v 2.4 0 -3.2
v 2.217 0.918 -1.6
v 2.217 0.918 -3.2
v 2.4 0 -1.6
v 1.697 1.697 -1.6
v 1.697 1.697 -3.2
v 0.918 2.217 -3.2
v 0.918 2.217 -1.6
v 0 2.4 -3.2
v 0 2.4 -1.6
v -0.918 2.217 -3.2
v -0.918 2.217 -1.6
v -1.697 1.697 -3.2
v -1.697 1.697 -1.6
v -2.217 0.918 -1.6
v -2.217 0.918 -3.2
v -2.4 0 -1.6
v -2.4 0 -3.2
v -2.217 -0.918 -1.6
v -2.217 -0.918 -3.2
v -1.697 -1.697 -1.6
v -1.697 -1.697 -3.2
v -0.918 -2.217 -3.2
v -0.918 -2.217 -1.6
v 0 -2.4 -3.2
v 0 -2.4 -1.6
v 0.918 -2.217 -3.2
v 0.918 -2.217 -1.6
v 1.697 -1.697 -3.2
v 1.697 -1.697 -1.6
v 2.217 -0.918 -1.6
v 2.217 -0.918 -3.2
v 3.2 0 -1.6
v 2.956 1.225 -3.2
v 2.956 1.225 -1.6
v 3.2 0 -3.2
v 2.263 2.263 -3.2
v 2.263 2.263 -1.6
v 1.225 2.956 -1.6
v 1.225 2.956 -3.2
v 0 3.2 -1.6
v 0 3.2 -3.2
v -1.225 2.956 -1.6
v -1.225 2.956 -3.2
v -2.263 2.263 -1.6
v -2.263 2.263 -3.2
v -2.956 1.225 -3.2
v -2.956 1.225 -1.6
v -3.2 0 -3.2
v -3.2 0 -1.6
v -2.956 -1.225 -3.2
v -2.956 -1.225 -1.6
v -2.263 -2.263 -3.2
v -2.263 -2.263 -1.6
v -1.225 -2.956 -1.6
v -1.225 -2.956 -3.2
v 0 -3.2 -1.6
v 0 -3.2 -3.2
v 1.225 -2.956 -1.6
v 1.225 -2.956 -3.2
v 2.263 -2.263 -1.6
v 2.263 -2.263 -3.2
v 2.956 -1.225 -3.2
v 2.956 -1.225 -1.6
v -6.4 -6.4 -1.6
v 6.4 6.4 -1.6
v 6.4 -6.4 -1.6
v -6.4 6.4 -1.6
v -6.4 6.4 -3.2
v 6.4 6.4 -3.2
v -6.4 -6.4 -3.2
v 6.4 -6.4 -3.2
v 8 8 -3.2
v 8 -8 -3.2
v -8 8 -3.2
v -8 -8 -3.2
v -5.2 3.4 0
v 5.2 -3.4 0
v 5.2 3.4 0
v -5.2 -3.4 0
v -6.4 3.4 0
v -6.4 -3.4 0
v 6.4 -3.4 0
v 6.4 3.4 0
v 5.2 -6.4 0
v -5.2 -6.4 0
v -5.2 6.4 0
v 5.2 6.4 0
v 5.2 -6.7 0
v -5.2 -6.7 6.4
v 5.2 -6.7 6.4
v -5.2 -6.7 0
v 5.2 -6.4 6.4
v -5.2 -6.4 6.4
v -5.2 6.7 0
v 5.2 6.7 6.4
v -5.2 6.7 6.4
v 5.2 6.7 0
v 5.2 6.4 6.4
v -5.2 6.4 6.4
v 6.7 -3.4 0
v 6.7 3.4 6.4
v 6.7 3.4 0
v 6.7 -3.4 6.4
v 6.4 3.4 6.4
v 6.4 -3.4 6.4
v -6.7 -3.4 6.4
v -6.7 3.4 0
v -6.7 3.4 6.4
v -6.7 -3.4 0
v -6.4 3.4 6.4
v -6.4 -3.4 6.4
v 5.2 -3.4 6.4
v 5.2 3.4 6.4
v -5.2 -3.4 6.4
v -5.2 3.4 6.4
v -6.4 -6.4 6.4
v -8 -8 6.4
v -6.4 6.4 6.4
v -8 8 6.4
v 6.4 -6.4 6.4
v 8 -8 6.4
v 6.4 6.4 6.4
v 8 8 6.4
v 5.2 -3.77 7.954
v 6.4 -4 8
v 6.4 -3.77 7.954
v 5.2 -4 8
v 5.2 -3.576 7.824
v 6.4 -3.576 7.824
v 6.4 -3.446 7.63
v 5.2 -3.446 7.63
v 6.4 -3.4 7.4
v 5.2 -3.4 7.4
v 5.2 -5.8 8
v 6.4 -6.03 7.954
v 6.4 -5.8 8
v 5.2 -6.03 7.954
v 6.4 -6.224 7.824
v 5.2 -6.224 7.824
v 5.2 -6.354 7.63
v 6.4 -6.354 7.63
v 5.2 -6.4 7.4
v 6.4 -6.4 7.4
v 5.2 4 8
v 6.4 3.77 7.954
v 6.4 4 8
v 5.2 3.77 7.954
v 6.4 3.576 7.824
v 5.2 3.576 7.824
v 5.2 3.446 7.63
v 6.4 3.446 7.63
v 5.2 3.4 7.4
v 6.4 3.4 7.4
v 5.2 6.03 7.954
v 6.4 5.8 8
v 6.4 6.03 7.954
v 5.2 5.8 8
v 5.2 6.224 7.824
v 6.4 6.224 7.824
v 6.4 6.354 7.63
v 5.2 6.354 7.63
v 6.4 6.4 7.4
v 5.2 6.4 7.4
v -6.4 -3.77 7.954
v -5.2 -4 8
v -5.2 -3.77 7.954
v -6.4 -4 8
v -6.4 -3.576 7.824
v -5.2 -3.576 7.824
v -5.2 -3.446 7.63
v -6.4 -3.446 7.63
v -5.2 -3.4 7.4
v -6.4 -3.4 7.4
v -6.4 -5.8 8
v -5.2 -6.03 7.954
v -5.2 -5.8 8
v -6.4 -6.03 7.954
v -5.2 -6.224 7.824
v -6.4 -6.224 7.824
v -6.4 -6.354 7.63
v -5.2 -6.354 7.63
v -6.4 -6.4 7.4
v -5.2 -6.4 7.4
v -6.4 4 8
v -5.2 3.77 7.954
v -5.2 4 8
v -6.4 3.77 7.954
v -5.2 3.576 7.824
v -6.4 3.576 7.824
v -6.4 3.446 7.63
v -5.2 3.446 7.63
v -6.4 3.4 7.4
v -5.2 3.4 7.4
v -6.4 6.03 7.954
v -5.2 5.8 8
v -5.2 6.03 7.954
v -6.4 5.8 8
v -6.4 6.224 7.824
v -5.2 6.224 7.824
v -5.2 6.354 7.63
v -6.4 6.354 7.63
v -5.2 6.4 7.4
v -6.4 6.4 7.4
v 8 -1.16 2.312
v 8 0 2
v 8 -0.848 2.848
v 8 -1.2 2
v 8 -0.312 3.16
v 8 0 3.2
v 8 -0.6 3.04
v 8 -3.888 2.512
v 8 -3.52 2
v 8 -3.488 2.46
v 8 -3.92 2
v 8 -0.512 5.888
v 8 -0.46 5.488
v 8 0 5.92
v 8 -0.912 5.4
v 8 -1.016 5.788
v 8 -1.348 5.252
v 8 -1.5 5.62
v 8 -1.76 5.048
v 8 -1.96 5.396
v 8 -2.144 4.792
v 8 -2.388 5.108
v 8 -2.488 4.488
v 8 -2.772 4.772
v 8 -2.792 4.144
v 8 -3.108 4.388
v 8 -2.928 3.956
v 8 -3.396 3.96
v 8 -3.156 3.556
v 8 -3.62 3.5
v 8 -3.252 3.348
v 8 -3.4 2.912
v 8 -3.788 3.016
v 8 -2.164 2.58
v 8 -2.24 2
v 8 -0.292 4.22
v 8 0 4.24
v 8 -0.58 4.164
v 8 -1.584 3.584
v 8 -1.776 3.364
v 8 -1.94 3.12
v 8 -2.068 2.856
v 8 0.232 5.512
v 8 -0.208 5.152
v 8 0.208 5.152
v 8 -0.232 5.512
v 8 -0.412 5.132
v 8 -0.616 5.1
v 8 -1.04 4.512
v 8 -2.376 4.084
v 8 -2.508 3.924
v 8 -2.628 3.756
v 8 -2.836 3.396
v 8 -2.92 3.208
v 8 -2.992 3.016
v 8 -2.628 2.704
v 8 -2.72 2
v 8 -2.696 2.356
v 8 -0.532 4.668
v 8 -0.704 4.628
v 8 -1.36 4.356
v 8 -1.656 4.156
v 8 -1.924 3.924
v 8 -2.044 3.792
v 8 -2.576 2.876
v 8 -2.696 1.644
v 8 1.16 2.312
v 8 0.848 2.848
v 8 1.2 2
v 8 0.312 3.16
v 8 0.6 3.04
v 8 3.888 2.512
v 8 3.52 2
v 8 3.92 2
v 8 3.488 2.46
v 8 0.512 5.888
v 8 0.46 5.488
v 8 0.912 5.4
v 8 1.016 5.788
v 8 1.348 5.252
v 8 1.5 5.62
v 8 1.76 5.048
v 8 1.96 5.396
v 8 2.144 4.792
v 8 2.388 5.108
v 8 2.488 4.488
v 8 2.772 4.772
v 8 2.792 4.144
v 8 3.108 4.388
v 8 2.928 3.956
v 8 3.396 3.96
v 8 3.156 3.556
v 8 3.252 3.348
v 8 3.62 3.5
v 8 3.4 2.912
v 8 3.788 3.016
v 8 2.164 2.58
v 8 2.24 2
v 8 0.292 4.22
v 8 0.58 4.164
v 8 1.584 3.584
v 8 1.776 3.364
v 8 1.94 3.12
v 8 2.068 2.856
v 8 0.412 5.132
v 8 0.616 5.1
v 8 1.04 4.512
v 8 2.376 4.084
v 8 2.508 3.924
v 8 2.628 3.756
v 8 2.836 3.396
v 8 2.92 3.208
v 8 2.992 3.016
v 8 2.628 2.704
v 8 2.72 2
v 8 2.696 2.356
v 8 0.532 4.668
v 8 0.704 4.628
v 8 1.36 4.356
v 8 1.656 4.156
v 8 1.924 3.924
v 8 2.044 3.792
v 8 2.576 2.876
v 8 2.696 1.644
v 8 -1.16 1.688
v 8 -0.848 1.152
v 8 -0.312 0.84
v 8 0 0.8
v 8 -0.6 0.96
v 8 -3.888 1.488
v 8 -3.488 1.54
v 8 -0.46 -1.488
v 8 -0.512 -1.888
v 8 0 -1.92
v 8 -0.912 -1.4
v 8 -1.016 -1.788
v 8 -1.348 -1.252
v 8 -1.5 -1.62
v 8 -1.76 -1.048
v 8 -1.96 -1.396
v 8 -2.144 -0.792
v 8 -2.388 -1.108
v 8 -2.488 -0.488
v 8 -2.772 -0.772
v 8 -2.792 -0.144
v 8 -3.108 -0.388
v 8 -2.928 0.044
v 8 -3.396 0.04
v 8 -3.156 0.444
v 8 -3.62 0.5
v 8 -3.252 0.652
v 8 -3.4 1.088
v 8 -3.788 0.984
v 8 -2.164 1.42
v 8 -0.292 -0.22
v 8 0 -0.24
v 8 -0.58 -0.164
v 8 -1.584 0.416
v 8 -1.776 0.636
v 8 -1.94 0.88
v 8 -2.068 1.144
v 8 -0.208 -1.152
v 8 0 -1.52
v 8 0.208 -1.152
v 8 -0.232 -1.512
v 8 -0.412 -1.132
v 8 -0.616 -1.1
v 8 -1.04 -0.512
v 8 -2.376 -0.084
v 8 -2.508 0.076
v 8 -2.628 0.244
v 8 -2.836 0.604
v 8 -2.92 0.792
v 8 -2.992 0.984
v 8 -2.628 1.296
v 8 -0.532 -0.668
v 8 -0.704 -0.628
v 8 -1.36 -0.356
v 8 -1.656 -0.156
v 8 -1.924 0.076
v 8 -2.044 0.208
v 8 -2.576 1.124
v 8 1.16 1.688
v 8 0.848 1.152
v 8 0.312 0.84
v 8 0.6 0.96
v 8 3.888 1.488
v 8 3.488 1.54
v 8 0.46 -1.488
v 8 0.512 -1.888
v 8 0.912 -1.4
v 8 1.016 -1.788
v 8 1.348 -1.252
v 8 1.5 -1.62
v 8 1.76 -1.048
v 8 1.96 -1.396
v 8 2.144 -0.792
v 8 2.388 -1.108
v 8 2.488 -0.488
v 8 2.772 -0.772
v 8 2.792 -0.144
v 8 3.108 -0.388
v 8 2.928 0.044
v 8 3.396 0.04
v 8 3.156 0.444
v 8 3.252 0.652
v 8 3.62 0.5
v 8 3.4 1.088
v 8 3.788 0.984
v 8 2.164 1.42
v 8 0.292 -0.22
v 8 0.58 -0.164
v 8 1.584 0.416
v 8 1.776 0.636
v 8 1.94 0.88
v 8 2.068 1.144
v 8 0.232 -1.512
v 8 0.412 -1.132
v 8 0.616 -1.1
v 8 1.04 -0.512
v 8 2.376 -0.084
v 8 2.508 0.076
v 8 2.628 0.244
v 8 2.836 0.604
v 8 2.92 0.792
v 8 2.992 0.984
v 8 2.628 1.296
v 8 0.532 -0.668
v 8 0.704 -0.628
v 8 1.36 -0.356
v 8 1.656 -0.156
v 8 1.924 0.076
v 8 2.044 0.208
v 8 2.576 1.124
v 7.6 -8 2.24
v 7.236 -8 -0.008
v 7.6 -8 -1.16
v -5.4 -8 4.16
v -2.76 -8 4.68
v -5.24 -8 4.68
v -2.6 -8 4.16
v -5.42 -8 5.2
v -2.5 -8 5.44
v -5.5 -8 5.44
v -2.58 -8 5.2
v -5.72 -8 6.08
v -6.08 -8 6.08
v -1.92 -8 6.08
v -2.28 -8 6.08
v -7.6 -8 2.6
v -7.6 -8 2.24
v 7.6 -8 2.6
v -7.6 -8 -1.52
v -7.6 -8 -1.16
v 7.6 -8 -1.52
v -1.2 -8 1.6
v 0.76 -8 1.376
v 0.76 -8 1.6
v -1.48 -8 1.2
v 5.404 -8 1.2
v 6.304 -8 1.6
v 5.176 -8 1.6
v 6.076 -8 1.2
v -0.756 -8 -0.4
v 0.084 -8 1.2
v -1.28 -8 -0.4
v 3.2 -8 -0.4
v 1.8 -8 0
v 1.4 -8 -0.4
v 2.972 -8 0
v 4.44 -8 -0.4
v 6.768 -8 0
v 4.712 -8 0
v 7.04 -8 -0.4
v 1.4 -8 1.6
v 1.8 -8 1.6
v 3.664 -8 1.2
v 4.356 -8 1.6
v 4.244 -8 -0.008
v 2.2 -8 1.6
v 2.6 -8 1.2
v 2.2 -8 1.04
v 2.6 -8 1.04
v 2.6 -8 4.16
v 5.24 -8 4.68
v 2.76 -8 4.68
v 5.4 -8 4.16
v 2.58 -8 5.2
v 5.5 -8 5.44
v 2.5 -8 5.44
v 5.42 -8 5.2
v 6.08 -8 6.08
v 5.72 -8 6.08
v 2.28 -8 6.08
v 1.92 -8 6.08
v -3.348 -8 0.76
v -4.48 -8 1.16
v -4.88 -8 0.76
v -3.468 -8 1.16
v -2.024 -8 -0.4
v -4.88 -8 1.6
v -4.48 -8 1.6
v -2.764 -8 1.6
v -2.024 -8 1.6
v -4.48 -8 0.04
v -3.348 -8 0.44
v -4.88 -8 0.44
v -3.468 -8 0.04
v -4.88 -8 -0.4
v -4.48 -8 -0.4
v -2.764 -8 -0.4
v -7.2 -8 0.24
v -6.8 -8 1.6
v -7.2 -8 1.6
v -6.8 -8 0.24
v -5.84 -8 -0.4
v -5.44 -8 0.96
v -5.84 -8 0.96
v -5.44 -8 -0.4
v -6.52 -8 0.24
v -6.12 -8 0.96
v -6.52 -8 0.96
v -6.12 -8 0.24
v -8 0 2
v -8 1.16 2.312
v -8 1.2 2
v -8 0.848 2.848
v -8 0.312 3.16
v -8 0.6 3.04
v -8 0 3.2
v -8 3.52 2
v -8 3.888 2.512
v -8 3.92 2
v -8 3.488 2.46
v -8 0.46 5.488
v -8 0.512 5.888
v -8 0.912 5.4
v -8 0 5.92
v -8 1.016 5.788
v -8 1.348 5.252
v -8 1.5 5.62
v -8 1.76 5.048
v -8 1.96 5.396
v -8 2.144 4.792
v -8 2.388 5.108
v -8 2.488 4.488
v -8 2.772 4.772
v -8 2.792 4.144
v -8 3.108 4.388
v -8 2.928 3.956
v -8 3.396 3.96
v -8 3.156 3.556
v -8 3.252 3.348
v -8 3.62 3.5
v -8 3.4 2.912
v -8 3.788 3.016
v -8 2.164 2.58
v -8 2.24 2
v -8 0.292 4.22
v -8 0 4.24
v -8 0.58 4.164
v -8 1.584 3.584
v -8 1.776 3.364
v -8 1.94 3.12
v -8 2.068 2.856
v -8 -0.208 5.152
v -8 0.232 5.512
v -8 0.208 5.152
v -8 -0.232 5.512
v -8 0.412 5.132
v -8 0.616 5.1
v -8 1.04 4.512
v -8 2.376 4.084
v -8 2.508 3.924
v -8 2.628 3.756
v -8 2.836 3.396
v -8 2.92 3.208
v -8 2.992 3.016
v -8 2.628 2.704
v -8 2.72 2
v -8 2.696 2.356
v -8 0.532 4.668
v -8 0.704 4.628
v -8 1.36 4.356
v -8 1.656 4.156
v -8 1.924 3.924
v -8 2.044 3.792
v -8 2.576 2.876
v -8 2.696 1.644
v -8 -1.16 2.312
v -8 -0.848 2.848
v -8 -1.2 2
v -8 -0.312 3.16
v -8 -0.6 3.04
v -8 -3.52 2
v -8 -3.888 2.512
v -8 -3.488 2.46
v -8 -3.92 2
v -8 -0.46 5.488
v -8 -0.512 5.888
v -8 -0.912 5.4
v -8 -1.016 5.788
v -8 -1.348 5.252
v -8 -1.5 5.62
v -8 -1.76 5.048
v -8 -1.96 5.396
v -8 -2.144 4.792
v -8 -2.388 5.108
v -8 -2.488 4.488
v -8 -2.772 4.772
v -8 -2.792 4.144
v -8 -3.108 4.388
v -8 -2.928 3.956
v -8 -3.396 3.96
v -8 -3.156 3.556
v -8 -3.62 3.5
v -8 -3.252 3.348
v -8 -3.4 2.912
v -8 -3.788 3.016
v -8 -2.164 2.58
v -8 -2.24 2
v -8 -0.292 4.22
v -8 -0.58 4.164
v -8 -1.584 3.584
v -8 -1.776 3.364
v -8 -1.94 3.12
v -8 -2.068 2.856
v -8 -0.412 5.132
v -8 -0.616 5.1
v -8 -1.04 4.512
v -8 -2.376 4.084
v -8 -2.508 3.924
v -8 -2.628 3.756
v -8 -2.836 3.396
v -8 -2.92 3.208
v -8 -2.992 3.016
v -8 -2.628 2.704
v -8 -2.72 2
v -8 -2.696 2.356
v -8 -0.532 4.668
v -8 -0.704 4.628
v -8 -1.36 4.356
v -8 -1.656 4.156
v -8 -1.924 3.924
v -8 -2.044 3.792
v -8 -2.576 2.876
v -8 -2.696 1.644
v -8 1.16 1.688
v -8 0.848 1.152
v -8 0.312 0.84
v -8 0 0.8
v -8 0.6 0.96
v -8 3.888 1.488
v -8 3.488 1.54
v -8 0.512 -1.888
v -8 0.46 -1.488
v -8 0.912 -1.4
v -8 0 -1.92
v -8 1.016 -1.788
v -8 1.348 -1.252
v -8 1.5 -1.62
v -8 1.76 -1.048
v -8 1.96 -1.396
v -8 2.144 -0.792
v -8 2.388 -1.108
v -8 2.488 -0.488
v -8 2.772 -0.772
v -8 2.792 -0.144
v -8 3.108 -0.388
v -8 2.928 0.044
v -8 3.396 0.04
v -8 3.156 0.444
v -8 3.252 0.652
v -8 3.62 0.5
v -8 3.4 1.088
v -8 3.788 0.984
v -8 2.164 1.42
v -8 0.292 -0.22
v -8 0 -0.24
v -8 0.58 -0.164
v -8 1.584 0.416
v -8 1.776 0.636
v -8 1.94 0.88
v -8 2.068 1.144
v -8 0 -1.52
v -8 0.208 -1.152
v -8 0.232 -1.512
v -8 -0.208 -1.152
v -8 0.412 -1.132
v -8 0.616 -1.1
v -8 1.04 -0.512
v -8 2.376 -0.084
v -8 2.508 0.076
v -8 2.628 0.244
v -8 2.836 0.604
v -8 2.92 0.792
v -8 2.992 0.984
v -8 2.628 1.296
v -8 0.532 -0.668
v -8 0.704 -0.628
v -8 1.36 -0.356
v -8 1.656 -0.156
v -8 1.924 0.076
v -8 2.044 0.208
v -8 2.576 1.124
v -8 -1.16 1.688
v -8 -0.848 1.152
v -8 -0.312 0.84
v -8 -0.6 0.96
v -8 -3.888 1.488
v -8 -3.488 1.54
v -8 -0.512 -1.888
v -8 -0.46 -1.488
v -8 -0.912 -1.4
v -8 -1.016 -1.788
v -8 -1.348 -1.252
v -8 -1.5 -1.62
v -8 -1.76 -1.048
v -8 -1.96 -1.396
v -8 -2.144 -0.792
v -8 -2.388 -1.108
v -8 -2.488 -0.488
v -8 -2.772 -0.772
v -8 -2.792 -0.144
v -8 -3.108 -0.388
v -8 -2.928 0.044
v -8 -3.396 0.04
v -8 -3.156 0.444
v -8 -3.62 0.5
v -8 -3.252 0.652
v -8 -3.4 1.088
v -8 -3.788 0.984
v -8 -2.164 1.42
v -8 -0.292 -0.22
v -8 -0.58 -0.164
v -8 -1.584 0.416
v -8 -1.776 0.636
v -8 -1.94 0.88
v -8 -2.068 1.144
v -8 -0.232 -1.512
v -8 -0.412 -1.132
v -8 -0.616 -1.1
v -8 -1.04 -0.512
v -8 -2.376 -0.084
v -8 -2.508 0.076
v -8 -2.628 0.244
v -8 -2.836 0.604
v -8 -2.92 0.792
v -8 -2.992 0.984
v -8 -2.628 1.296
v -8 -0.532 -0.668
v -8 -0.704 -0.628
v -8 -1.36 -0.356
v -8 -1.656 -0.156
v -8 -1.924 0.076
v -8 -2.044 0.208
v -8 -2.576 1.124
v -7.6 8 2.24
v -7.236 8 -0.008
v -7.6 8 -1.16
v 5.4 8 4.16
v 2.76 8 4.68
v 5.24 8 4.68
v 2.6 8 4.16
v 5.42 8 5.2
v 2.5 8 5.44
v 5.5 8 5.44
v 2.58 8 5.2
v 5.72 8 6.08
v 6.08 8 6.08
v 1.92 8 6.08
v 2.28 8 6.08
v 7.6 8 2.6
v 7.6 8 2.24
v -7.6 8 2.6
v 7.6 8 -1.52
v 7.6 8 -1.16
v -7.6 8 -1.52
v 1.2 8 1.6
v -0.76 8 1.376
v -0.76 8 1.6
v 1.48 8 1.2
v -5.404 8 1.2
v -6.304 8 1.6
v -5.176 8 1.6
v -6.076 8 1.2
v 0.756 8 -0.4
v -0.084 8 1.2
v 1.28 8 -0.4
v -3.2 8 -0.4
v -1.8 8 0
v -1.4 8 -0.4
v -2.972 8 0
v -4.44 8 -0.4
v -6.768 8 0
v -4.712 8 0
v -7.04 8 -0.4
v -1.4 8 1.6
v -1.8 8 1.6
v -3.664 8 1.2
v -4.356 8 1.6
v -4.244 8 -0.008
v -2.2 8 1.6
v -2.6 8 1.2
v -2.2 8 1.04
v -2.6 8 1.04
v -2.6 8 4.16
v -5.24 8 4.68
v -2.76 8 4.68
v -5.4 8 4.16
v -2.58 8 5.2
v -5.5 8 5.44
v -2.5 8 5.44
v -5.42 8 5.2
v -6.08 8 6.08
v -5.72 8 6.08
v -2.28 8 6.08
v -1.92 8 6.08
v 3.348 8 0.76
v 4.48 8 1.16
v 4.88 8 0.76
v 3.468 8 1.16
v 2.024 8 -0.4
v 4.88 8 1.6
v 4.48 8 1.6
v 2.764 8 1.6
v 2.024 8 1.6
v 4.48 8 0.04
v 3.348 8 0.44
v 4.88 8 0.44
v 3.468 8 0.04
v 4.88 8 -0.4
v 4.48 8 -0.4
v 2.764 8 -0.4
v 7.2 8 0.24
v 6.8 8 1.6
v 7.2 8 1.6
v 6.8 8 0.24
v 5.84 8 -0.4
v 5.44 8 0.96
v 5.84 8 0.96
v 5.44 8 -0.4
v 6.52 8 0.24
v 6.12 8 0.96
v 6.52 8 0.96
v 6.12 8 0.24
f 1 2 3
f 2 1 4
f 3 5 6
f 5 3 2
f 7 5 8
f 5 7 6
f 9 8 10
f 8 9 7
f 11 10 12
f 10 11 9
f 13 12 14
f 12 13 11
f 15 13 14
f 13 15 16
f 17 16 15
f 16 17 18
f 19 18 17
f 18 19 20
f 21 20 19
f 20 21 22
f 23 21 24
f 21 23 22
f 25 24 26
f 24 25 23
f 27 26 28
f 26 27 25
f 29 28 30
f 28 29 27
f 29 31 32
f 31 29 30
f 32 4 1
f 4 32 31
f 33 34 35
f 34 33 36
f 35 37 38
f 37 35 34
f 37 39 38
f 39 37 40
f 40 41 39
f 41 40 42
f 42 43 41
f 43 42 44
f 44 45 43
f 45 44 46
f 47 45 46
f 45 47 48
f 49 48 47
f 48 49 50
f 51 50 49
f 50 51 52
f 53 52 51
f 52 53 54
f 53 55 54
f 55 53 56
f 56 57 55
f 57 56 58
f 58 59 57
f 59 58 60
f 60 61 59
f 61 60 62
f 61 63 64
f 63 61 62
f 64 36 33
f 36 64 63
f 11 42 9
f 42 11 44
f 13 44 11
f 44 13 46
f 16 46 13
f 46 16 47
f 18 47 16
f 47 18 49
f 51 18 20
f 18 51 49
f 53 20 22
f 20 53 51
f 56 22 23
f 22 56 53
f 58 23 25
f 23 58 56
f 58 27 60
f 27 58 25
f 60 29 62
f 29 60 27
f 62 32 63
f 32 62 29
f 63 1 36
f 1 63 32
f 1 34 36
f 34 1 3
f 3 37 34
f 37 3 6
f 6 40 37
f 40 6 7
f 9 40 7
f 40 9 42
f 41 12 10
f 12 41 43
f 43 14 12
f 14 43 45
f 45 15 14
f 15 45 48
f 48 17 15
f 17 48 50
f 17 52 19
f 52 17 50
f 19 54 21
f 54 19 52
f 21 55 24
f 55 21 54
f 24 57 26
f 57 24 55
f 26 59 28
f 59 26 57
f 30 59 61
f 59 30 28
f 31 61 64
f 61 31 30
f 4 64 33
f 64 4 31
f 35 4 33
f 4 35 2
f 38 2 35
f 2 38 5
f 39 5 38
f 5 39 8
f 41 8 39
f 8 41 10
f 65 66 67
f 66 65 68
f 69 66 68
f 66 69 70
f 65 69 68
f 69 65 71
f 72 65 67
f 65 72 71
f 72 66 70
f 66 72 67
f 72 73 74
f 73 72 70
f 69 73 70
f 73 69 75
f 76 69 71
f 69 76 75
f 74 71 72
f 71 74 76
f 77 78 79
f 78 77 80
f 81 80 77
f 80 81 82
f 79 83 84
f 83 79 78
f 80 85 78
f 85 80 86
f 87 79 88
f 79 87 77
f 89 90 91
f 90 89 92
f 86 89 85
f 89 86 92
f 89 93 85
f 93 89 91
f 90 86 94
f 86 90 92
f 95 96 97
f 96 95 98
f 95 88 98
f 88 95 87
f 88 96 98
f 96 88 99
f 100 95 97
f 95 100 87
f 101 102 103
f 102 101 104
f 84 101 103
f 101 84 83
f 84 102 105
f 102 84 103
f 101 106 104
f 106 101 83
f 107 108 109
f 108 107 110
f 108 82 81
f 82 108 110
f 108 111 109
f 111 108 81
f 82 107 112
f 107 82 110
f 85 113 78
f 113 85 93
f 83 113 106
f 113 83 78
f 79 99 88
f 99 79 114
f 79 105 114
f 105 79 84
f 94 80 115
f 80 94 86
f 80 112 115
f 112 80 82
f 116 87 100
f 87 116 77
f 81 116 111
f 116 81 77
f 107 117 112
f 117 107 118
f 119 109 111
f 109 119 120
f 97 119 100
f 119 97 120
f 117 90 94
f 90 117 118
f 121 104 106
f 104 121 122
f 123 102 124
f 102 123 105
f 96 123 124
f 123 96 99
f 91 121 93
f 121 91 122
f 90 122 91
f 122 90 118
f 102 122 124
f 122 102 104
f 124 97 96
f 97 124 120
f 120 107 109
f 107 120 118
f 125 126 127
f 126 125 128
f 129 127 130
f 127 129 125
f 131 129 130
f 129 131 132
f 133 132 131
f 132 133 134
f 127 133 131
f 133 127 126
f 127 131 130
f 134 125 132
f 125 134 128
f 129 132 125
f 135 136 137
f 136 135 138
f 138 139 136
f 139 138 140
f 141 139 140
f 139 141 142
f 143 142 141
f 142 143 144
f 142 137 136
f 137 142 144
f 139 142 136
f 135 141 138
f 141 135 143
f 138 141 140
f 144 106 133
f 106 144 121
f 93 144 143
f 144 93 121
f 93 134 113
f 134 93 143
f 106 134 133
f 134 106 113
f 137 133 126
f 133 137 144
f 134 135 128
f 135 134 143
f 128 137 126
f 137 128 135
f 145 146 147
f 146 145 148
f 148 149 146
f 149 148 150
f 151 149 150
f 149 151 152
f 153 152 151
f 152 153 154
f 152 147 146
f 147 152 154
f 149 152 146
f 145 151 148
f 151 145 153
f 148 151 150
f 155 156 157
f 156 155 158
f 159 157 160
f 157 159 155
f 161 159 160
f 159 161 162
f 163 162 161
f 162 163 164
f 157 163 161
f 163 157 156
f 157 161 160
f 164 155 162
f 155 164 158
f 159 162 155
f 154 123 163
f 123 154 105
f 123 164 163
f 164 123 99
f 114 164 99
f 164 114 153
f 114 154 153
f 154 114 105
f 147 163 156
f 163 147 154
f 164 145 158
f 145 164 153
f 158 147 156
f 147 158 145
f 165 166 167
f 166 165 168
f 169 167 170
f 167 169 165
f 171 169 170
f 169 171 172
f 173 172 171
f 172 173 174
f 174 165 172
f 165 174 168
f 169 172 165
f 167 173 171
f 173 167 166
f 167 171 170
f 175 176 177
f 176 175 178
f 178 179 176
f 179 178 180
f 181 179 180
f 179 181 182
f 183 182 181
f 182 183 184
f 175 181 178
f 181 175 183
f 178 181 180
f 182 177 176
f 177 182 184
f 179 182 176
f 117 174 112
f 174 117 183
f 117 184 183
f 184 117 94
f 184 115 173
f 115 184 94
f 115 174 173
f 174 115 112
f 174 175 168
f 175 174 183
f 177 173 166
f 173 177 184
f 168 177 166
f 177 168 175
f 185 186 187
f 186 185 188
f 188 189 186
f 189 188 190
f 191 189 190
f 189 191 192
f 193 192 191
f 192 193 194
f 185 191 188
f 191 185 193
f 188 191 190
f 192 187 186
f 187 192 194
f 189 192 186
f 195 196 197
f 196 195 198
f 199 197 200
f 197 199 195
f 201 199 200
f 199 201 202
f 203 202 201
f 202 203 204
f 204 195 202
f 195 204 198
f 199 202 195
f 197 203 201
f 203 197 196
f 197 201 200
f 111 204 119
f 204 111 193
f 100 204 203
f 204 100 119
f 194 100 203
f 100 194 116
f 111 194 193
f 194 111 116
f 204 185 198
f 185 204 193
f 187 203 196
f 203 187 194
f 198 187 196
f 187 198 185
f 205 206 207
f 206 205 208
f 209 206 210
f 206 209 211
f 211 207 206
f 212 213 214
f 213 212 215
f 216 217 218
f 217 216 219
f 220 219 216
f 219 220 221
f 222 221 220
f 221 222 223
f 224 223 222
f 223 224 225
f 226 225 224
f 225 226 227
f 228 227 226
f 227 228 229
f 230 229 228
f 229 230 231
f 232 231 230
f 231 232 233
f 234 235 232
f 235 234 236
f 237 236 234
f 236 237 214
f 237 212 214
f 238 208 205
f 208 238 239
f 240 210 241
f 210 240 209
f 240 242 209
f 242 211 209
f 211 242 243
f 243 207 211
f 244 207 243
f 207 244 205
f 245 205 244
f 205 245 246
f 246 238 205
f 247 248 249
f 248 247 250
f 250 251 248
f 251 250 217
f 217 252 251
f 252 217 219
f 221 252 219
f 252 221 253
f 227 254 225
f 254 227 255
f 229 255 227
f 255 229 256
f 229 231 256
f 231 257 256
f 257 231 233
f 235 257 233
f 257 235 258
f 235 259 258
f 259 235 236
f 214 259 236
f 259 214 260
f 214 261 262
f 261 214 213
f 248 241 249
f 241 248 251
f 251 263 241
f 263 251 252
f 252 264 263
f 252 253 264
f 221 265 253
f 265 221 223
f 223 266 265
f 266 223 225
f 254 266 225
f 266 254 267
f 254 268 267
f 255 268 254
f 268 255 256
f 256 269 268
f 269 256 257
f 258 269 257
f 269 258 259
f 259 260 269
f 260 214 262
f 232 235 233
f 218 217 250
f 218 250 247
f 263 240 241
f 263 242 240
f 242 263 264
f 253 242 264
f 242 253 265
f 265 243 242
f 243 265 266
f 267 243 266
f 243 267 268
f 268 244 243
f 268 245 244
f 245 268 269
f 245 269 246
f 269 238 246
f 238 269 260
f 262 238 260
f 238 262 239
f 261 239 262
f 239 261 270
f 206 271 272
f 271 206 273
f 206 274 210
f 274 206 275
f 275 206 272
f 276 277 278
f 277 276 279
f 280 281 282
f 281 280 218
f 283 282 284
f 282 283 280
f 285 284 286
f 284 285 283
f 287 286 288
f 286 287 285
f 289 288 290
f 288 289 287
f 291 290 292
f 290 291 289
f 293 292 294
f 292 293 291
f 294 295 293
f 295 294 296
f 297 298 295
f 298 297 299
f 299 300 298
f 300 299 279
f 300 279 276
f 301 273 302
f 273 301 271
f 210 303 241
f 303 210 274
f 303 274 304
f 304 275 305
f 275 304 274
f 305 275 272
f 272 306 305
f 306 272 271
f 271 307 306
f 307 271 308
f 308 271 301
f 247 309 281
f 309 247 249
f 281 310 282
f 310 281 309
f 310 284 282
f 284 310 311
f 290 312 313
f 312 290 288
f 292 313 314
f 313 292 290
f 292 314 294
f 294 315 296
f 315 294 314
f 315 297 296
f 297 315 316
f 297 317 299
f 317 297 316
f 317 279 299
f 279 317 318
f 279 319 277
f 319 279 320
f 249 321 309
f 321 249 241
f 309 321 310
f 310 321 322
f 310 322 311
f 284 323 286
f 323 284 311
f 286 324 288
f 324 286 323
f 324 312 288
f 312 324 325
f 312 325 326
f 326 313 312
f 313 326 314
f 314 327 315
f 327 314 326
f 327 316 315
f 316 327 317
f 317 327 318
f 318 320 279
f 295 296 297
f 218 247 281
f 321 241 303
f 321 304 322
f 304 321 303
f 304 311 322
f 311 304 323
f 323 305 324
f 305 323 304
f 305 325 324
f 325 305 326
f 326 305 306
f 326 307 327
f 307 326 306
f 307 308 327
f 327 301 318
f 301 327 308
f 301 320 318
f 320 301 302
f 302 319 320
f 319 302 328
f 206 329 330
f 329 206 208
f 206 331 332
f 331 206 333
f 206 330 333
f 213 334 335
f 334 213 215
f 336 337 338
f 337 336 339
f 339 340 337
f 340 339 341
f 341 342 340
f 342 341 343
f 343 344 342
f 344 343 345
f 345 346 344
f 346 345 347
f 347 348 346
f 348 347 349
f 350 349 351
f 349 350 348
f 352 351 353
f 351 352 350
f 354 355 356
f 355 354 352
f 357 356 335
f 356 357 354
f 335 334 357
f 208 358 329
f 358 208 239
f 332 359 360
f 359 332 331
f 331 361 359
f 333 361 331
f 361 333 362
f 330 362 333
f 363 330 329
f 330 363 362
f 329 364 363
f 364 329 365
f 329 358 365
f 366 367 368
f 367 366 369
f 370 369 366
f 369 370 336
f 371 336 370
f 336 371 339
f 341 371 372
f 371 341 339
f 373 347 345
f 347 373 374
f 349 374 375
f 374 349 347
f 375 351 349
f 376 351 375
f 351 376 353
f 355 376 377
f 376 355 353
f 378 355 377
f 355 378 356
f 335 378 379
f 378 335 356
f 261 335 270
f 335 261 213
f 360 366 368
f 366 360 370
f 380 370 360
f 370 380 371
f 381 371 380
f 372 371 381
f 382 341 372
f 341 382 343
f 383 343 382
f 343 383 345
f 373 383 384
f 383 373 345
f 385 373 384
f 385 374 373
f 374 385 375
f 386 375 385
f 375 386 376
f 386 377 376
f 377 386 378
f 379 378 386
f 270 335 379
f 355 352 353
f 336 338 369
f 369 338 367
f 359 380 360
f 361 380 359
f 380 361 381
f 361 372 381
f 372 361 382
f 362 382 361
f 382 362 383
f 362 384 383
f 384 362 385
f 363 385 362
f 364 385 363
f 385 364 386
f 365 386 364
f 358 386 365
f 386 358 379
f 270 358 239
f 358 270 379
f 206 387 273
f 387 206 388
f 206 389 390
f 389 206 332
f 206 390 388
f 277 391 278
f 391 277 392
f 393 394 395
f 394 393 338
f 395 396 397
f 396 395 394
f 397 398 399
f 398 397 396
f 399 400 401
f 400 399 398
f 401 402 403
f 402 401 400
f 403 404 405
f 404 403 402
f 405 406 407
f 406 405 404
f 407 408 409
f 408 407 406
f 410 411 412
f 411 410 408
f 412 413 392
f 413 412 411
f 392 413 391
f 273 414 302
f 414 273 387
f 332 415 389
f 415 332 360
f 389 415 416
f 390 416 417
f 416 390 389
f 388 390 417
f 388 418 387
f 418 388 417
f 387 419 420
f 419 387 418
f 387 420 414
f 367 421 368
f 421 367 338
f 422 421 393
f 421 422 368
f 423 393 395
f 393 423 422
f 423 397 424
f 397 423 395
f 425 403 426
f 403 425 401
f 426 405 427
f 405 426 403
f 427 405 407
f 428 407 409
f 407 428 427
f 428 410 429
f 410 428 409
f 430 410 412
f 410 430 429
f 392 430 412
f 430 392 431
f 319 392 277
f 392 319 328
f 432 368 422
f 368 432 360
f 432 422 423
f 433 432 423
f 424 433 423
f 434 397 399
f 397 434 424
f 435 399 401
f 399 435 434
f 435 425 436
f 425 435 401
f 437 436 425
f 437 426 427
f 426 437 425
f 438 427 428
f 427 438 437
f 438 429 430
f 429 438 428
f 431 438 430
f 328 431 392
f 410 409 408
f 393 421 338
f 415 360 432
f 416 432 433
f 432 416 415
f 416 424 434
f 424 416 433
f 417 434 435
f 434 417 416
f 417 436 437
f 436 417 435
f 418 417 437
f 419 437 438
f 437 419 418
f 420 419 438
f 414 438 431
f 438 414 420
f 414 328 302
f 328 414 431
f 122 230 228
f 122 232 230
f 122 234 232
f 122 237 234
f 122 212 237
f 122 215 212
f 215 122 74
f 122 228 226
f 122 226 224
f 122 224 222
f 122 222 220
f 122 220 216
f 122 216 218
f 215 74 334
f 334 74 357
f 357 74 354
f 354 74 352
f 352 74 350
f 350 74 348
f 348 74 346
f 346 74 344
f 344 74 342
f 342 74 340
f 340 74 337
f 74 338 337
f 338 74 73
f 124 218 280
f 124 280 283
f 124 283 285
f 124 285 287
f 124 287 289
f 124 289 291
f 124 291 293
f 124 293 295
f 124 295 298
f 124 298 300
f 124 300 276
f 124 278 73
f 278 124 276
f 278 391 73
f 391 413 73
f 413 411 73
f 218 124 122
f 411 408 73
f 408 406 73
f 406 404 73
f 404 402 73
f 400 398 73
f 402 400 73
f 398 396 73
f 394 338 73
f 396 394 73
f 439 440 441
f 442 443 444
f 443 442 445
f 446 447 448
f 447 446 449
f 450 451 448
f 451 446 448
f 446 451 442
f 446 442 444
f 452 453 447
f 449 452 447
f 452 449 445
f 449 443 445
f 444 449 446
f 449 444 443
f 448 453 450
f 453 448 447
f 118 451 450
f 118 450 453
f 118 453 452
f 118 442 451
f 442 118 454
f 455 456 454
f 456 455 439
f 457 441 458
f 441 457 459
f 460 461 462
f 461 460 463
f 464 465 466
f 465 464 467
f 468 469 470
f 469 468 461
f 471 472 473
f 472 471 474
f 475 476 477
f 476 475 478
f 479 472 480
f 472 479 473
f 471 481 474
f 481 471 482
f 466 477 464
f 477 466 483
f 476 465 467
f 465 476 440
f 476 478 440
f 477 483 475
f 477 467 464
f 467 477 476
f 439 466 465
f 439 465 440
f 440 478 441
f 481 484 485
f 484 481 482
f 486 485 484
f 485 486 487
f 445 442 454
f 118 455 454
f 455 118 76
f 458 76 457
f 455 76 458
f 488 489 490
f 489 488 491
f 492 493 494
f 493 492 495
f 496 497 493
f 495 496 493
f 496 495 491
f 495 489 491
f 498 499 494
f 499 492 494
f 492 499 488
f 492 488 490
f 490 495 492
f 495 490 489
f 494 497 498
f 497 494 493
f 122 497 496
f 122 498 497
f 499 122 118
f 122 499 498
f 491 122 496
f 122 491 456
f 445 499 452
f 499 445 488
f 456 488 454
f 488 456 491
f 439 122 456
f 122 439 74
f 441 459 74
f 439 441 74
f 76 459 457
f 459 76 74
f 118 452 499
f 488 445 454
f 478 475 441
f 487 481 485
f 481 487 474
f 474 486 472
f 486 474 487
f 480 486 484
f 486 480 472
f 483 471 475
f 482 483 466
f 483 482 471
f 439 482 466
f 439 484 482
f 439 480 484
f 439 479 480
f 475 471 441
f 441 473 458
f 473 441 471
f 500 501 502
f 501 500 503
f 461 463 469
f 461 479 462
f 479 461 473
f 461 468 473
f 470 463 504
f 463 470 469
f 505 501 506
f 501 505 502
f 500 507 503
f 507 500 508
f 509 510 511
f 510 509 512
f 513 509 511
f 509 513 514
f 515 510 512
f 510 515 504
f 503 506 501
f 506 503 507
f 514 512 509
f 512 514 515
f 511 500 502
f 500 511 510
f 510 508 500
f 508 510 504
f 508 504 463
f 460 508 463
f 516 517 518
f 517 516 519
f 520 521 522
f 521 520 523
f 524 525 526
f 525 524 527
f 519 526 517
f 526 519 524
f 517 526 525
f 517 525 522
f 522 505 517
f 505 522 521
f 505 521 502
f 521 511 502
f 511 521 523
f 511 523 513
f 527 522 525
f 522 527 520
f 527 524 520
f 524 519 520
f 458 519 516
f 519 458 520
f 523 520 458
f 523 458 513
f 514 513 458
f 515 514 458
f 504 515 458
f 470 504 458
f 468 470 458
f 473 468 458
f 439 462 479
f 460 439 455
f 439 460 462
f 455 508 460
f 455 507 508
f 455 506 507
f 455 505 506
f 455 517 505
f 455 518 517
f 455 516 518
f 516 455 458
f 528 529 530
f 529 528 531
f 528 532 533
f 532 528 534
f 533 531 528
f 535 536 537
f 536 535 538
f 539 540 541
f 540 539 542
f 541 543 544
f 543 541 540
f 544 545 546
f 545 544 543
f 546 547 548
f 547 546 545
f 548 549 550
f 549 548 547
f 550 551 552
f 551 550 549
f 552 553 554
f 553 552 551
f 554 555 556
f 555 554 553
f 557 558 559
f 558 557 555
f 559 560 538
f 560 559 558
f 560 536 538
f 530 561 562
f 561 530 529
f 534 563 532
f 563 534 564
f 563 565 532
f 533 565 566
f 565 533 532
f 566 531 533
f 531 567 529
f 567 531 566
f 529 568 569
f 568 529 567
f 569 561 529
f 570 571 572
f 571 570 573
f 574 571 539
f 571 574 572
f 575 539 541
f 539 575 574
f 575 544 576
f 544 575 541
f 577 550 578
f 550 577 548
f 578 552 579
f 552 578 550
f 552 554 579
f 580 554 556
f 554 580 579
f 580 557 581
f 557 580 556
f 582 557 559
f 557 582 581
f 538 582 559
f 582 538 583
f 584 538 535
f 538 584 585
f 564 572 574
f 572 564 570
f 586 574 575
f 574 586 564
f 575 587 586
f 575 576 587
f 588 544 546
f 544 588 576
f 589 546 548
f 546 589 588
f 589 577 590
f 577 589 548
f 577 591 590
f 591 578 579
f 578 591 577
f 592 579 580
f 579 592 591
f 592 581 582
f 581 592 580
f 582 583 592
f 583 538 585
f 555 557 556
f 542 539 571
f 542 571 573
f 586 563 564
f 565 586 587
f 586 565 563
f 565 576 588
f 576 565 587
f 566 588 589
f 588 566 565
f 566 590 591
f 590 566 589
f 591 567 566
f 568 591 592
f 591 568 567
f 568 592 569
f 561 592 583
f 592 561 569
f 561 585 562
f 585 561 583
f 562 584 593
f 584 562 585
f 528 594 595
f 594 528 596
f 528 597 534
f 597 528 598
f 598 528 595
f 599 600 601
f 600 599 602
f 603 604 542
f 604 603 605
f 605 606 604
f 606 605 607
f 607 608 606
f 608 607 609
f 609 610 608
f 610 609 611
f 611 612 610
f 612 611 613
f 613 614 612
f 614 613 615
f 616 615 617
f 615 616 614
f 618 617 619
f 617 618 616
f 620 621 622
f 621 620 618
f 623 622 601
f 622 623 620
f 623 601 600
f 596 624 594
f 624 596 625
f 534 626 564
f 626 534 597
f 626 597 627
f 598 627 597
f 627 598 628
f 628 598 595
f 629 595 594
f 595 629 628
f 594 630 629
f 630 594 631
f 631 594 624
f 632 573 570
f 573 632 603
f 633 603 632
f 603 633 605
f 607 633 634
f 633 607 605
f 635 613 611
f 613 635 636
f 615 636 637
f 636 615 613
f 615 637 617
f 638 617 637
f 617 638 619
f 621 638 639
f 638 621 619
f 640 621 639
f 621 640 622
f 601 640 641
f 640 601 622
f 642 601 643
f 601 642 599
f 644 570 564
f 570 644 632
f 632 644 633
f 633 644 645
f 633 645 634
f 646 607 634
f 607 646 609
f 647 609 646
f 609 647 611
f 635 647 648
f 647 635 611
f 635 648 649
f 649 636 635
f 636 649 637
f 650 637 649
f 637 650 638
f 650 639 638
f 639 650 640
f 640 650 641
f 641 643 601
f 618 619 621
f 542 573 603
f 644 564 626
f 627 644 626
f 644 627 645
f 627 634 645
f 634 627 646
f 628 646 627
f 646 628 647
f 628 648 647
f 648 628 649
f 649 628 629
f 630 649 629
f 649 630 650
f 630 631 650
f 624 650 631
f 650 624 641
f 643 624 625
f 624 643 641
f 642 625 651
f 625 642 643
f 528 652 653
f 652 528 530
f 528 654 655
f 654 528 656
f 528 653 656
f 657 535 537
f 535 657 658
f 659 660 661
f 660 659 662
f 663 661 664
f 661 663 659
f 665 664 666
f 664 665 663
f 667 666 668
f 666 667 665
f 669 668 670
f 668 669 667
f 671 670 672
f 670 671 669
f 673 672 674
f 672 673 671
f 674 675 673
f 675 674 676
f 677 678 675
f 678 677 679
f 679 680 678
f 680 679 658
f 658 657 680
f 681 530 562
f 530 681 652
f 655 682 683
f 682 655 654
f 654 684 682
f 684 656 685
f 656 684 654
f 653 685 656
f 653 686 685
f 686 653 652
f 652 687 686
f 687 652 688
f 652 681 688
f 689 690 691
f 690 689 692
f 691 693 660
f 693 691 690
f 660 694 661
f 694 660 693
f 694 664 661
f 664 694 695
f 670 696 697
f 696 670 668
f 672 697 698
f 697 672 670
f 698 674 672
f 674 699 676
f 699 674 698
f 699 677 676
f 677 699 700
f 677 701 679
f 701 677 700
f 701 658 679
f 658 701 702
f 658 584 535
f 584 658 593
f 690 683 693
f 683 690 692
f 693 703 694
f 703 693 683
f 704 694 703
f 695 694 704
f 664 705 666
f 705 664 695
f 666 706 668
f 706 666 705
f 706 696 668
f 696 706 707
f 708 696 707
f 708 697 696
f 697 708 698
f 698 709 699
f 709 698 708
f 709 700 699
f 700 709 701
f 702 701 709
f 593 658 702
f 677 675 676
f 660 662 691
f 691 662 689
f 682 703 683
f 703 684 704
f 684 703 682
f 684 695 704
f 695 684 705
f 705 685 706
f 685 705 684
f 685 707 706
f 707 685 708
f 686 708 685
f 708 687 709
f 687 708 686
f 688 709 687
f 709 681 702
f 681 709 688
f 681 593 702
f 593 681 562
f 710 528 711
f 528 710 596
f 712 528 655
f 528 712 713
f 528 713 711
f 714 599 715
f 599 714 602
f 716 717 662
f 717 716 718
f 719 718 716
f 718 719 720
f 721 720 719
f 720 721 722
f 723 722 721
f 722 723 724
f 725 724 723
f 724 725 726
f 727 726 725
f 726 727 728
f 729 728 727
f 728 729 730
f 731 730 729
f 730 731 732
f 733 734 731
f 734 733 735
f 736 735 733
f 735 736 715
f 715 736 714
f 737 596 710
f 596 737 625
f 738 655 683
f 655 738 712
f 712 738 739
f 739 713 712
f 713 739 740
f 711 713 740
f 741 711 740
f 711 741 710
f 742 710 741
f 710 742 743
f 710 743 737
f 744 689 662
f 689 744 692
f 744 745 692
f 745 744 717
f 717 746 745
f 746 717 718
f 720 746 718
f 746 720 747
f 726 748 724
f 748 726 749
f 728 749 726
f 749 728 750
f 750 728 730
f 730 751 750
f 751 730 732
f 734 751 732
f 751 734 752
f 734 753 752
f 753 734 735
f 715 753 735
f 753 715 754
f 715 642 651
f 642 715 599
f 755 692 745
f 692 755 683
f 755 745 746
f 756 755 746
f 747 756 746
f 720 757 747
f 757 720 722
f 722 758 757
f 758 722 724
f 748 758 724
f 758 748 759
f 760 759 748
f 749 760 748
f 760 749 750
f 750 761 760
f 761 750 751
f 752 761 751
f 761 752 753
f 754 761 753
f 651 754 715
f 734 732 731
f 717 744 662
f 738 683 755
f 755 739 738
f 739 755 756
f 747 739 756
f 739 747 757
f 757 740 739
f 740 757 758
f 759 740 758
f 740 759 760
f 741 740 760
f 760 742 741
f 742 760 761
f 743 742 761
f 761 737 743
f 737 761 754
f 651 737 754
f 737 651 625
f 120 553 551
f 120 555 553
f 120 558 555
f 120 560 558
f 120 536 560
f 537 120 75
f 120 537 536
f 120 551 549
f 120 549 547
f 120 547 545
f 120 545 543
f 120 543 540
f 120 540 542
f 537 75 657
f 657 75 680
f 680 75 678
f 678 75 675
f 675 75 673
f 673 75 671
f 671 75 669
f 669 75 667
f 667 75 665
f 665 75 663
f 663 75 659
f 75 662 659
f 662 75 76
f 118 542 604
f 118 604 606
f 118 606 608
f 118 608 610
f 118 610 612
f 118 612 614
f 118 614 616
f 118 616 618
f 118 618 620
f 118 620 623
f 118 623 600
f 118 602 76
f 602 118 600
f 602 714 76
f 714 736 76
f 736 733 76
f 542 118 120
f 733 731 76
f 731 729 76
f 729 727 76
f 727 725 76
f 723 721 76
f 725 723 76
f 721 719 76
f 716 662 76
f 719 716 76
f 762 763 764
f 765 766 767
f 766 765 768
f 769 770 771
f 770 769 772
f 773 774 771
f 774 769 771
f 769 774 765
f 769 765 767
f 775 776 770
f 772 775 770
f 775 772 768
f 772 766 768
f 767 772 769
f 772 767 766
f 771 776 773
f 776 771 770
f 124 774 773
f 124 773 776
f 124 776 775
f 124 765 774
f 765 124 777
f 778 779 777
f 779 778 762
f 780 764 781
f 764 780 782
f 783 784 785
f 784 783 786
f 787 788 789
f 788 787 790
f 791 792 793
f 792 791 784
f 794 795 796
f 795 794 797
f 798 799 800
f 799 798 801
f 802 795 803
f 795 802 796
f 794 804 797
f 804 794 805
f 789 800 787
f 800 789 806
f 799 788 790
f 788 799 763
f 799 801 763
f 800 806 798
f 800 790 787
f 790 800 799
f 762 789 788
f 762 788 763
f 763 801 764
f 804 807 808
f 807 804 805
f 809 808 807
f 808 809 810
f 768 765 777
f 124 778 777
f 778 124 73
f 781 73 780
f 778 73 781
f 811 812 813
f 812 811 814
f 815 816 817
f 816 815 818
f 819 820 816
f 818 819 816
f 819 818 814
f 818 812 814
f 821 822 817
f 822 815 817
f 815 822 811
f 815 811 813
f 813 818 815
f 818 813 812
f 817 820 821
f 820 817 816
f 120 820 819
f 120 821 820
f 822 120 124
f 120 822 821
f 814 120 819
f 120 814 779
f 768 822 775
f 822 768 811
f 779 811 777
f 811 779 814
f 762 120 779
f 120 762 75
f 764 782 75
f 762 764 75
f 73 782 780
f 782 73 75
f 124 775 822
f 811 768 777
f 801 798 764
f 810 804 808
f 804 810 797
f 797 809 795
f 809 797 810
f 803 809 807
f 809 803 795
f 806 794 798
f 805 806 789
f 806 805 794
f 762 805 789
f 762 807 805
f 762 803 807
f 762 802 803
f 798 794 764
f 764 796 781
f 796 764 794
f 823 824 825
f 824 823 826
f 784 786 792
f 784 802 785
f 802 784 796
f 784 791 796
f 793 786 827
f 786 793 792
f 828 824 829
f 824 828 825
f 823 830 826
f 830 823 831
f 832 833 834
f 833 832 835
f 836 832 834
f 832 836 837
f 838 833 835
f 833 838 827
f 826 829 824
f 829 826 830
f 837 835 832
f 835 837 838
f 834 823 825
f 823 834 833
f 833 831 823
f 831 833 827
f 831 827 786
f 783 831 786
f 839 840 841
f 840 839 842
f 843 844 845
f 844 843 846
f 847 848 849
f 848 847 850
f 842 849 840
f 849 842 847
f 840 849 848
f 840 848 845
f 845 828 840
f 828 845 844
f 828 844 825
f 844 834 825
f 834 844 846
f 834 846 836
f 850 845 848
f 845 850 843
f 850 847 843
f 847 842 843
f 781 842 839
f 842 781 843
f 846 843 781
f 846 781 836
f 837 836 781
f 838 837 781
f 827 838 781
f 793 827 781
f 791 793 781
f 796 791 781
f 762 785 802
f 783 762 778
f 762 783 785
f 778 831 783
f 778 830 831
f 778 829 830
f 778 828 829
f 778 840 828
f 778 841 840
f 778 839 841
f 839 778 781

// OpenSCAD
use <../lib.scad>
use <../p/box0.scad>
use <s/35700ps1s01.scad>
use <s/35700s01.scad>
function ldraw_lib__35700ps1() = [
// 0 Container  2 x  2 x  1 Crate with SW Imperial Insignia Pattern and Aurebesh "CARGO" Text Pattern
// 0 Name: 35700ps1.dat
// 0 Author: Gerald Lasser [GeraldLasser]
// 0 !LDRAW_ORG Part UPDATE 2022-01
// 0 !LICENSE Licensed under CC BY 4.0 : see CAreadme.txt
// 
// 0 BFC CERTIFY CCW
  [0,"BFC","CERTIFY"],
  [0,"BFC","CCW"],
// 
// 0 !KEYWORDS BrickLink 35700pb05, Rebrickable 35700pr0005, set 75290
// 
// 0 !HISTORY 2022-01-14 [PTadmin] Official Update 2022-01
// 
// 
// 1 16 0 0 0 1 0 0 0 1 0 0 0 1 s\35700s01.dat
  [1,16,0,0,0,1,0,0,0,1,0,0,0,1, ldraw_lib__s__35700s01()],
// 1 16 0 -4 0 20 0 0 0 12 0 0 0 20 box0.dat
  [1,16,0,-4,0,20,0,0,0,12,0,0,0,20, ldraw_lib__box0()],
// 1 16 0 0 0 1 0 0 0 1 0 0 0 1 s\35700ps1s01.dat
  [1,16,0,0,0,1,0,0,0,1,0,0,0,1, ldraw_lib__s__35700ps1s01()],
// 1 16 0 0 0 -1 0 0 0 1 0 0 0 -1 s\35700ps1s01.dat
  [1,16,0,0,0,-1,0,0,0,1,0,0,0,-1, ldraw_lib__s__35700ps1s01()],
];
module ldraw_lib__35700ps1(step=0, col=false, unit=2/5, alt=false, line=0.2, solid=!$preview)
    makepoly(ldraw_lib__35700ps1(), step=step, col=col, unit=unit, alt=alt, line=line, solid=solid);
ldraw_lib__35700ps1(line=0.2);
